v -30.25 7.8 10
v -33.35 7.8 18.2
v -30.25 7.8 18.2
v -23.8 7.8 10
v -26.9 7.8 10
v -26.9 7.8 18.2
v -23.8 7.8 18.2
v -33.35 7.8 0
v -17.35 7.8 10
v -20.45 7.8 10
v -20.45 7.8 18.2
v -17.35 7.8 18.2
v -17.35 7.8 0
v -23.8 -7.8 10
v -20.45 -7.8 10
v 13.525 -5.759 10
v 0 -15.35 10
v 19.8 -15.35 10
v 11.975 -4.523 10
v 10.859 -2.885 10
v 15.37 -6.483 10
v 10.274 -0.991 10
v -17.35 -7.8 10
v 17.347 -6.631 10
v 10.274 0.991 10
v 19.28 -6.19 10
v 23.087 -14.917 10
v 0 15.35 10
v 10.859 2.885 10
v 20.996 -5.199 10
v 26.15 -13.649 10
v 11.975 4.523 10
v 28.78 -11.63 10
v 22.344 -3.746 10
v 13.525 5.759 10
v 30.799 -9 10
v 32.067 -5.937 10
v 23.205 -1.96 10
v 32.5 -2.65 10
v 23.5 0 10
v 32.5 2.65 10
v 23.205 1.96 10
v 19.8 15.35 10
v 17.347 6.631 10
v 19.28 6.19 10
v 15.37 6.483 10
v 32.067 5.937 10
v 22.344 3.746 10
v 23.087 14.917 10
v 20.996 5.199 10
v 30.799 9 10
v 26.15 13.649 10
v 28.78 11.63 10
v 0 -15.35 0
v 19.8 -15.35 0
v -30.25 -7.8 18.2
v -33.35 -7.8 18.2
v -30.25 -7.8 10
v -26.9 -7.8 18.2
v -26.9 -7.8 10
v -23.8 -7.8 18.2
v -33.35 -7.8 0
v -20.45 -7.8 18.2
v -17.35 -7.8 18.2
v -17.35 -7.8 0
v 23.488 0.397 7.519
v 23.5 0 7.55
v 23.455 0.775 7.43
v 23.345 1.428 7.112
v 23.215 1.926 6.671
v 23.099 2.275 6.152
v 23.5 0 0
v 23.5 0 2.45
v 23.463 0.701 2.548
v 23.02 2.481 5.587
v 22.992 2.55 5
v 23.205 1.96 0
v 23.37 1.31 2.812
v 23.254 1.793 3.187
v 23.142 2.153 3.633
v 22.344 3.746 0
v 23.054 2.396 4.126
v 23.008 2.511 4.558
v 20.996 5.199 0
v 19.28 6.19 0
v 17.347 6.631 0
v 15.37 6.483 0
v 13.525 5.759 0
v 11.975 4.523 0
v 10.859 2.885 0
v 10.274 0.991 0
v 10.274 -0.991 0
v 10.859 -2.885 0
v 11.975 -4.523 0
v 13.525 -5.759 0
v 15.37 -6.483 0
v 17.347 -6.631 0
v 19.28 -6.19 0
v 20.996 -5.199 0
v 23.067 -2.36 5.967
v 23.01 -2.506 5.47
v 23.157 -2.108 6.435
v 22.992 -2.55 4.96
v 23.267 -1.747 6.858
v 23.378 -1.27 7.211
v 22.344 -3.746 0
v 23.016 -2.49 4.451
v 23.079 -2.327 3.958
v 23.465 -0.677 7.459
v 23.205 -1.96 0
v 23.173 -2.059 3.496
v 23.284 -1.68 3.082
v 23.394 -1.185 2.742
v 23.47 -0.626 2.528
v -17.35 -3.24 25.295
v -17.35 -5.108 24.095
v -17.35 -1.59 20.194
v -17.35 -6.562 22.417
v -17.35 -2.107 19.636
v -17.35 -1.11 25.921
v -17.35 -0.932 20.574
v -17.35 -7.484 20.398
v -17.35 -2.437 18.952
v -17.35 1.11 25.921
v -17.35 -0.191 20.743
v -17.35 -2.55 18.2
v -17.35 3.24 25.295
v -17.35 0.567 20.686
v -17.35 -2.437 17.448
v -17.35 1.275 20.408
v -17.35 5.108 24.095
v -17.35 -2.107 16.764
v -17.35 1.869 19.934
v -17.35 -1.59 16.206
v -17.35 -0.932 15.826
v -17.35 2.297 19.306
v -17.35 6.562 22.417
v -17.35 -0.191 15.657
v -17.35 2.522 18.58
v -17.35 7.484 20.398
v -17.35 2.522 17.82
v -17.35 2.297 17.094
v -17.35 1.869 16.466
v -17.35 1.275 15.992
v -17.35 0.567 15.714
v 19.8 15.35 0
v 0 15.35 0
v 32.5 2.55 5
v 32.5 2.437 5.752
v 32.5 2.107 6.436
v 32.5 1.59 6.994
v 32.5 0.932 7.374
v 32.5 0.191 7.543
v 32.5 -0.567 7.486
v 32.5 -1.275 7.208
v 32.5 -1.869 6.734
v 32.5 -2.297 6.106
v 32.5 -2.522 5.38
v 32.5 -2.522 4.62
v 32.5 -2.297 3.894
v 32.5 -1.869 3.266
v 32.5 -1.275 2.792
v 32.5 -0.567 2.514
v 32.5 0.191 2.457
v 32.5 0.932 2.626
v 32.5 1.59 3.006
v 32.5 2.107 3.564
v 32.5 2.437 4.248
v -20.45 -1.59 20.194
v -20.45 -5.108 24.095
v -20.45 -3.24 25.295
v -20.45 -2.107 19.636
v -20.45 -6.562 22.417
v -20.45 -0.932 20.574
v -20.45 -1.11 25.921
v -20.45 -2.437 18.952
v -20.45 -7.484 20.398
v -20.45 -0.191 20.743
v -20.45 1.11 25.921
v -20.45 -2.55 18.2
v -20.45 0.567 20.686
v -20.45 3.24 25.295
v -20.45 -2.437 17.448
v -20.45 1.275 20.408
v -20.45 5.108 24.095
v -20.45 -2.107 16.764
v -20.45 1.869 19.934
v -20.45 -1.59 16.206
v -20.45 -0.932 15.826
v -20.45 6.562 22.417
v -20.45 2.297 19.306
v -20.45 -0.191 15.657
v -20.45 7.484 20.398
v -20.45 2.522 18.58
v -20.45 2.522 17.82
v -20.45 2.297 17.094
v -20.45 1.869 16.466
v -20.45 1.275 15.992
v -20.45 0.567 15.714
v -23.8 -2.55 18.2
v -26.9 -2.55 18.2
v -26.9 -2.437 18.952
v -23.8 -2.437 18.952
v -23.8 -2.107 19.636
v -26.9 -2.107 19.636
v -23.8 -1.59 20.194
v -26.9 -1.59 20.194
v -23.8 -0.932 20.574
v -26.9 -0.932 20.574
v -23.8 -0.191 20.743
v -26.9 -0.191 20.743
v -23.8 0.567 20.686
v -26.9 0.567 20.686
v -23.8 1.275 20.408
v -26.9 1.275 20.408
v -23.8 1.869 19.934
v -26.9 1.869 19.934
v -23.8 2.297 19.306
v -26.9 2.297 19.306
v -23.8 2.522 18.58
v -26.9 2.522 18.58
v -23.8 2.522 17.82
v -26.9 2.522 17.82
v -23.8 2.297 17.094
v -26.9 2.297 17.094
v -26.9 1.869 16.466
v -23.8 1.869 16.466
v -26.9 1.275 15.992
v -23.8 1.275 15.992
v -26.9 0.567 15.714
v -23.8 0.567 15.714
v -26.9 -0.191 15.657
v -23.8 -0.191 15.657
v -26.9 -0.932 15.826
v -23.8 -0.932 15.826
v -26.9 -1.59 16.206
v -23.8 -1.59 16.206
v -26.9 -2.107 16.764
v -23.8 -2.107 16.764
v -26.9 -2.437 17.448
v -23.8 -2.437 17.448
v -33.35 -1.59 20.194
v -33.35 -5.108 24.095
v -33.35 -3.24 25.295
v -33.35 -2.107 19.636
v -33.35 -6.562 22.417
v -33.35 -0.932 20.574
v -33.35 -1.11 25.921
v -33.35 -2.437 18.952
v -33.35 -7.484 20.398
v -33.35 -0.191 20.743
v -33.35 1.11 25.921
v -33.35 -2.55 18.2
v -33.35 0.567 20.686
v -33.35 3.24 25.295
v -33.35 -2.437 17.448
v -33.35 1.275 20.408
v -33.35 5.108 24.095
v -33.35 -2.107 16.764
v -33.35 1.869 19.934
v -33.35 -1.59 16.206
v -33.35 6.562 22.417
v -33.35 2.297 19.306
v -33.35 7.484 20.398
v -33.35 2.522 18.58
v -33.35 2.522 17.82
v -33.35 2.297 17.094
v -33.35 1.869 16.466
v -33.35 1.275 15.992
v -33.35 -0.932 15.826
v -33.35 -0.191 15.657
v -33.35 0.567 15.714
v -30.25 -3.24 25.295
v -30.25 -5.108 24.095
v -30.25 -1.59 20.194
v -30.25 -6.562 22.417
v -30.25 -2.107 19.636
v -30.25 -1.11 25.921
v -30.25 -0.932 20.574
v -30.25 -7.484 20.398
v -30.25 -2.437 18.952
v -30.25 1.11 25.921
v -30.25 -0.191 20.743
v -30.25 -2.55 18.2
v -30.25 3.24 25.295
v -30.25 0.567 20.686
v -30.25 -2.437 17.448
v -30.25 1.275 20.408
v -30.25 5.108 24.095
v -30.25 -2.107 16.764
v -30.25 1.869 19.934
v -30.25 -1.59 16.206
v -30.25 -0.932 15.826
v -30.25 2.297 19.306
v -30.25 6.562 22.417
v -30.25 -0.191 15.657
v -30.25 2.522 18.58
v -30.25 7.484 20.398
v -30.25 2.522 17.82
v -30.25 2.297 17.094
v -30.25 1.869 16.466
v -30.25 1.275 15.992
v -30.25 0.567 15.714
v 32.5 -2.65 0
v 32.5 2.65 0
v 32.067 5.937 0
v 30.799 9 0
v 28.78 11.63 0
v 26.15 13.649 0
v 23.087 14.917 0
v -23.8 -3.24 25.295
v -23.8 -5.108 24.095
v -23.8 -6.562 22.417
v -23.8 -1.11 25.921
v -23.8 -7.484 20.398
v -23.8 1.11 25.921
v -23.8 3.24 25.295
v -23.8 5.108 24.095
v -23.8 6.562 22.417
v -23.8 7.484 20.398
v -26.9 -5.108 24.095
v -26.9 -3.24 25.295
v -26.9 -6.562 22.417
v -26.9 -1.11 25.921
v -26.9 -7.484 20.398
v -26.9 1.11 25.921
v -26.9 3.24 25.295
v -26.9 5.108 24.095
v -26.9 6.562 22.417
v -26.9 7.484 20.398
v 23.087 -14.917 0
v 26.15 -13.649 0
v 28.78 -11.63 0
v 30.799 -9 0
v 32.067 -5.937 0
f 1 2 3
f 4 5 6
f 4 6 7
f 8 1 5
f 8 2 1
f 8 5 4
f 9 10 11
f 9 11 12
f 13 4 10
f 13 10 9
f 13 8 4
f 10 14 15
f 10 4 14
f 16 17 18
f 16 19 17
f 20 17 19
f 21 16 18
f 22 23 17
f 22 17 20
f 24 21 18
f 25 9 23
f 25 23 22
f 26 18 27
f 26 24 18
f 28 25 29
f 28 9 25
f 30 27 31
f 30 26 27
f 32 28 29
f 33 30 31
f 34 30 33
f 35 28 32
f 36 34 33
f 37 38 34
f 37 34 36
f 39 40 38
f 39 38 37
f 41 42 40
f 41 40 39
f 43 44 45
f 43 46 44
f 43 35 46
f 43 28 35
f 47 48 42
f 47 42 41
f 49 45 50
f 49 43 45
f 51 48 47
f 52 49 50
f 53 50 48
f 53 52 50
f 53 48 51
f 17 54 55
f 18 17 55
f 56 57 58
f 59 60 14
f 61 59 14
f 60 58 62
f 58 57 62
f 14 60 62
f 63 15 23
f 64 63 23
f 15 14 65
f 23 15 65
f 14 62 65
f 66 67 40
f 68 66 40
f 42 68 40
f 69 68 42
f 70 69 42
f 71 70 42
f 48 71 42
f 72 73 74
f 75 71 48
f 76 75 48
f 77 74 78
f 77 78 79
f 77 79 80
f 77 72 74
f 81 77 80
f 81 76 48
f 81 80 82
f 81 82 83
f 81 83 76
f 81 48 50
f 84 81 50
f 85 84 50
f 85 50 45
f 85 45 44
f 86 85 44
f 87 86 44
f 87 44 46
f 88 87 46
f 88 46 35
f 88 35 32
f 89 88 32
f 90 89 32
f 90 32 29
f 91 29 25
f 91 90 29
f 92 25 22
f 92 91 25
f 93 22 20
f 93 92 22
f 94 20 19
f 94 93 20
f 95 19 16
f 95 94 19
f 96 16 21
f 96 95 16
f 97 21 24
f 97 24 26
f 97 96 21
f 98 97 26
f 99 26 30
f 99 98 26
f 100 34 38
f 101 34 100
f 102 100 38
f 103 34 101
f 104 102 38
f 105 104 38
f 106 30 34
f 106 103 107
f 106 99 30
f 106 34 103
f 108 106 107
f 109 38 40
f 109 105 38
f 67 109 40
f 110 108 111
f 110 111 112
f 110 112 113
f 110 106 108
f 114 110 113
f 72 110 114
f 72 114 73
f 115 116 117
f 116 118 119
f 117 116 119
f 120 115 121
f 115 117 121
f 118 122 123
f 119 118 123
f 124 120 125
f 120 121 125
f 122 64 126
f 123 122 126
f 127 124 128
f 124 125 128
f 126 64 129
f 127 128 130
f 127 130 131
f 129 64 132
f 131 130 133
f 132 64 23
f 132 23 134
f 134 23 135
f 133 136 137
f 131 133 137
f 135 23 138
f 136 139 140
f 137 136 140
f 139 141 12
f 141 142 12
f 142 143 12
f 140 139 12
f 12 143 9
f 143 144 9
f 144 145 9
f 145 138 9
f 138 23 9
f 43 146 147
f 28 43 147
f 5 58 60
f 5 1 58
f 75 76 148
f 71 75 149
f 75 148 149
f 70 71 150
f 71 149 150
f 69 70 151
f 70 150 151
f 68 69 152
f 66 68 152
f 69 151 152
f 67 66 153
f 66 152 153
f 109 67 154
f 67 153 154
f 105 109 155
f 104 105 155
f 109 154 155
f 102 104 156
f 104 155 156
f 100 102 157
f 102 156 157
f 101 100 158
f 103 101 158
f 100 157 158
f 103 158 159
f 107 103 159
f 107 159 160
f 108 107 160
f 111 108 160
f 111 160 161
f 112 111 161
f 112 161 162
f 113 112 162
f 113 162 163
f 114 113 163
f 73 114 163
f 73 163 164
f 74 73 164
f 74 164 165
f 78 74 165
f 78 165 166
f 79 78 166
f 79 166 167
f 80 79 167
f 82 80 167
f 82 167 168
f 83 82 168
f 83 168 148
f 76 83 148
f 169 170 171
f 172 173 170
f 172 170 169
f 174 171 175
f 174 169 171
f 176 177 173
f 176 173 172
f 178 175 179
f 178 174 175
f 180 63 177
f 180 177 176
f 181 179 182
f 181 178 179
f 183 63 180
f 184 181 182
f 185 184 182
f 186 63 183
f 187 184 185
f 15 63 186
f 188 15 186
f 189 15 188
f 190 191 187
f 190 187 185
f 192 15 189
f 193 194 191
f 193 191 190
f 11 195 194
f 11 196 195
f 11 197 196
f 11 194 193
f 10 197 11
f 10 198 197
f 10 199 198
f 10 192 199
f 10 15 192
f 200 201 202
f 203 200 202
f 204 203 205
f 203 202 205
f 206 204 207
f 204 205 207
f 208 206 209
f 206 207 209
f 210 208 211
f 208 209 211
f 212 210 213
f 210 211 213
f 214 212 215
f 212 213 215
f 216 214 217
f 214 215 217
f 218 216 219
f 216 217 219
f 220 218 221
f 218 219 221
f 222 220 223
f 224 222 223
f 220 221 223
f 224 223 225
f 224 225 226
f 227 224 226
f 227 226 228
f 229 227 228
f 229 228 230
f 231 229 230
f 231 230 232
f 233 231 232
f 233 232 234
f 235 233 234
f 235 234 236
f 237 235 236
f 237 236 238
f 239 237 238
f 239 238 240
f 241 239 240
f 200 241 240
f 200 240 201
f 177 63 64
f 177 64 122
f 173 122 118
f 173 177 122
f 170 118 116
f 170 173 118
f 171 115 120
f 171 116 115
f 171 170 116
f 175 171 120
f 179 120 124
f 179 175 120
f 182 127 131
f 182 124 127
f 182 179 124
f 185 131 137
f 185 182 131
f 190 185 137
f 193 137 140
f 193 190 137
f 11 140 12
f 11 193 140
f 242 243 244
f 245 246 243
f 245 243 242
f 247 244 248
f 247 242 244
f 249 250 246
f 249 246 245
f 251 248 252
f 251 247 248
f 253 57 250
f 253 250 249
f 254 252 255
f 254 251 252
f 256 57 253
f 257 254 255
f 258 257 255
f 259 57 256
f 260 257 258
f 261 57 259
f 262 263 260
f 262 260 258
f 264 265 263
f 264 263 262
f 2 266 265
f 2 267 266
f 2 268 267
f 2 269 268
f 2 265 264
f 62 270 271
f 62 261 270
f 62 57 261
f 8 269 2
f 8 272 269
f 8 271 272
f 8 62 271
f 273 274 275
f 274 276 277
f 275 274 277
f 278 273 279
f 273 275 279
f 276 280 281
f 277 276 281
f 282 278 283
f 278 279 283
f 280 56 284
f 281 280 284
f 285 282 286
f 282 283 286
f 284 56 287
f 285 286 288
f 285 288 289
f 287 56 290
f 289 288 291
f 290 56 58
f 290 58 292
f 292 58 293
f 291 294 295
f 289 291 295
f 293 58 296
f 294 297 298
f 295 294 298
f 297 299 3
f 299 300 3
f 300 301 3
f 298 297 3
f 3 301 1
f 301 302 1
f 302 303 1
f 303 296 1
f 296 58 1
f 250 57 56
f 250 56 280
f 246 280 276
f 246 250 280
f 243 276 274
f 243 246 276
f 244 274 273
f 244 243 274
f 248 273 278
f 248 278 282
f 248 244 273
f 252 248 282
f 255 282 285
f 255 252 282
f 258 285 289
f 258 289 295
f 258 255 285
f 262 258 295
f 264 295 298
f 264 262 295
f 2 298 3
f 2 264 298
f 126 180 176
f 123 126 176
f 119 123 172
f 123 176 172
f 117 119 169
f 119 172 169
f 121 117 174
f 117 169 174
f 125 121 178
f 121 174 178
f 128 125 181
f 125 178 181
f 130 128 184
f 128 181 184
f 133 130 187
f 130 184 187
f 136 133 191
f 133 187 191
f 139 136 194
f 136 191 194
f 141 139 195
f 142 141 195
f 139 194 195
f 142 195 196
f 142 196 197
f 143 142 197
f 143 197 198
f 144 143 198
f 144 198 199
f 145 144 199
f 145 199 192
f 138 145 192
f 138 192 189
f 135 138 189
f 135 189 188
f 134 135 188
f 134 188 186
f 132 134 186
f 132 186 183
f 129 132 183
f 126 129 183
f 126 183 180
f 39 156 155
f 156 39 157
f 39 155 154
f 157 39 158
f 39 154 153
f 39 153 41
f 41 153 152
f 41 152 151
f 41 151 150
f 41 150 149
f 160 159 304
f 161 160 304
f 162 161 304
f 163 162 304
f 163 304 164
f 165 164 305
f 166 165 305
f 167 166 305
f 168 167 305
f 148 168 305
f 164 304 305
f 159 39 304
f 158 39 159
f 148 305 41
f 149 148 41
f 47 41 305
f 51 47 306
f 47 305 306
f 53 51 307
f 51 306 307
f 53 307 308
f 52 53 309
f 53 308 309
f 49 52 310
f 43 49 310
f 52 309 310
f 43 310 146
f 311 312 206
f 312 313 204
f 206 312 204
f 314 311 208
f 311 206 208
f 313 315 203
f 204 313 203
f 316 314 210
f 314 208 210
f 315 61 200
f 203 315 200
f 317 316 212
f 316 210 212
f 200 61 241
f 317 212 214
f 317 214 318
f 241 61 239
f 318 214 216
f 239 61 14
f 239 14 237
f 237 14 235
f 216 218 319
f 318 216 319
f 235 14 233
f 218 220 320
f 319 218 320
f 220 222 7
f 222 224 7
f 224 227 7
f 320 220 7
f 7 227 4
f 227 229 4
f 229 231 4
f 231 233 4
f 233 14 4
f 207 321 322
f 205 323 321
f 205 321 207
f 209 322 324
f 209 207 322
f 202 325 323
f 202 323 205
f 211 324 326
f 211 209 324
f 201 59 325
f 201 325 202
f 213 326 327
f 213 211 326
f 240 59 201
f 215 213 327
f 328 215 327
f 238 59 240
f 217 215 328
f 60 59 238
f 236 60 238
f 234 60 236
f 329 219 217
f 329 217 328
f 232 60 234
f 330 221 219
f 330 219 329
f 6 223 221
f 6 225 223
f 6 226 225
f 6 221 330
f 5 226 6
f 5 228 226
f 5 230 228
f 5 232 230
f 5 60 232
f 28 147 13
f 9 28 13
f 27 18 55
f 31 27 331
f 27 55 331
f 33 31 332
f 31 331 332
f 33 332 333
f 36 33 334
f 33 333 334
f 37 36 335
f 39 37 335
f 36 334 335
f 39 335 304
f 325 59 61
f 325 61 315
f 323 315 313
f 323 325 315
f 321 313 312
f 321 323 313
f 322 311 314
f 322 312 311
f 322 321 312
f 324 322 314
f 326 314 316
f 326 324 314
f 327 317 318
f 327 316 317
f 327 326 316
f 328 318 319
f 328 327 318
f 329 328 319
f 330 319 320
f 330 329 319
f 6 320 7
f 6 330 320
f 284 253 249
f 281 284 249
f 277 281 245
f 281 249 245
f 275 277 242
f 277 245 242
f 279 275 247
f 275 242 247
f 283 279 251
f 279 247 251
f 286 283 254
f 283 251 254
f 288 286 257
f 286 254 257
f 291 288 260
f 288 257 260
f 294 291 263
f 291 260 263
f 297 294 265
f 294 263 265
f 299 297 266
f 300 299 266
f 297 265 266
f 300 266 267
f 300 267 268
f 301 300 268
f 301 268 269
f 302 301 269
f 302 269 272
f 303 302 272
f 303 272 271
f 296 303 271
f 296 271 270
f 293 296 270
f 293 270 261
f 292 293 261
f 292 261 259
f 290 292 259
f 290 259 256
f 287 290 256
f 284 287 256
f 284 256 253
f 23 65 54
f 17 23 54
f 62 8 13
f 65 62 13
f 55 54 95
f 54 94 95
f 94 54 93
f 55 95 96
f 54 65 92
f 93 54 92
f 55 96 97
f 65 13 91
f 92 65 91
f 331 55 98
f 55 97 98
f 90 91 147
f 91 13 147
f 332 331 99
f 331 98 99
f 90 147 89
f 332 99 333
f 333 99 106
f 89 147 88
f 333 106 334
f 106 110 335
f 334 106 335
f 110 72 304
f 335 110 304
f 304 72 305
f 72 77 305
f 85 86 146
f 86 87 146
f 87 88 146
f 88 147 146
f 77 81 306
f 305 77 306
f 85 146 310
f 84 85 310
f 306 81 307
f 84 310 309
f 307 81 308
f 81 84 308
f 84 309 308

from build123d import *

# Parameters (mm, degrees)
SKETCH_R        = 6.65
PAD_DEPTH       = 10
SKETCH001_R     = 2.55
POCKET_DEPTH    = 10
SKETCH002_W     = 3.1
SKETCH002_H     = 15.6
PAD001_DEPTH    = 16
SKETCH003_R     = 2.55
POCKET001_DEPTH = 65.851


with BuildPart() as part:
    # Sketch → Pad (new body)
    with BuildSketch(Plane.XY):
        with BuildLine():
            Line((0, -15.35), (19.8, -15.35))
            ThreePointArc((19.8, -15.35), (28.780256, -11.630256), (32.5, -2.65))
            Line((32.5, -2.65), (32.5, 2.65))
            ThreePointArc((32.5, 2.65), (28.780256, 11.630256), (19.8, 15.35))
            Line((19.8, 15.35), (0, 15.35))
            Line((0, 15.35), (-17.35, 7.8))
            Line((-17.35, 7.8), (-33.35, 7.8))
            Line((-33.35, 7.8), (-33.35, -7.8))
            Line((-33.35, -7.8), (-17.35, -7.8))
            Line((-17.35, -7.8), (0, -15.35))
        make_face()
        with Locations((16.85, 0)):
            Circle(SKETCH_R, mode=Mode.SUBTRACT)
    extrude(amount=PAD_DEPTH)

    # Sketch001 (on Face3 of Pad) → Pocket (cut)
    with BuildSketch(Plane.YZ.offset(32.5)):
        with Locations((0, 5)):
            Circle(SKETCH001_R)
    extrude(amount=-POCKET_DEPTH, mode=Mode.SUBTRACT)

    # Sketch002 (on Face5 of Pocket) → Pad001 (join)
    with BuildSketch(Plane.XY.offset(10)):
        with Locations((-31.8, 0)):
            Rectangle(SKETCH002_W, SKETCH002_H)
        with Locations((-25.35, 0)):
            Rectangle(SKETCH002_W, SKETCH002_H)
        with Locations((-18.9, 0)):
            Rectangle(SKETCH002_W, SKETCH002_H)
    extrude(amount=PAD001_DEPTH)

    # Sketch003 (on Face24 of Pad001) → Pocket001 (cut, through all)
    with BuildSketch(Plane(origin=(-33.35, 0, 0), x_dir=(0, -1, 0), z_dir=(-1, 0, 0))):
        with Locations((0, 18.2)):
            Circle(SKETCH003_R)
        with BuildLine():
            ThreePointArc((7.8, 18.2), (0, 26), (-7.8, 18.2))
            Line((-7.8, 26.2), (-7.8, 18.2))
            Line((7.8, 26.2), (-7.8, 26.2))
            Line((7.8, 18.2), (7.8, 26.2))
        make_face()
    extrude(amount=-POCKET001_DEPTH, mode=Mode.SUBTRACT)


solid = part.part
